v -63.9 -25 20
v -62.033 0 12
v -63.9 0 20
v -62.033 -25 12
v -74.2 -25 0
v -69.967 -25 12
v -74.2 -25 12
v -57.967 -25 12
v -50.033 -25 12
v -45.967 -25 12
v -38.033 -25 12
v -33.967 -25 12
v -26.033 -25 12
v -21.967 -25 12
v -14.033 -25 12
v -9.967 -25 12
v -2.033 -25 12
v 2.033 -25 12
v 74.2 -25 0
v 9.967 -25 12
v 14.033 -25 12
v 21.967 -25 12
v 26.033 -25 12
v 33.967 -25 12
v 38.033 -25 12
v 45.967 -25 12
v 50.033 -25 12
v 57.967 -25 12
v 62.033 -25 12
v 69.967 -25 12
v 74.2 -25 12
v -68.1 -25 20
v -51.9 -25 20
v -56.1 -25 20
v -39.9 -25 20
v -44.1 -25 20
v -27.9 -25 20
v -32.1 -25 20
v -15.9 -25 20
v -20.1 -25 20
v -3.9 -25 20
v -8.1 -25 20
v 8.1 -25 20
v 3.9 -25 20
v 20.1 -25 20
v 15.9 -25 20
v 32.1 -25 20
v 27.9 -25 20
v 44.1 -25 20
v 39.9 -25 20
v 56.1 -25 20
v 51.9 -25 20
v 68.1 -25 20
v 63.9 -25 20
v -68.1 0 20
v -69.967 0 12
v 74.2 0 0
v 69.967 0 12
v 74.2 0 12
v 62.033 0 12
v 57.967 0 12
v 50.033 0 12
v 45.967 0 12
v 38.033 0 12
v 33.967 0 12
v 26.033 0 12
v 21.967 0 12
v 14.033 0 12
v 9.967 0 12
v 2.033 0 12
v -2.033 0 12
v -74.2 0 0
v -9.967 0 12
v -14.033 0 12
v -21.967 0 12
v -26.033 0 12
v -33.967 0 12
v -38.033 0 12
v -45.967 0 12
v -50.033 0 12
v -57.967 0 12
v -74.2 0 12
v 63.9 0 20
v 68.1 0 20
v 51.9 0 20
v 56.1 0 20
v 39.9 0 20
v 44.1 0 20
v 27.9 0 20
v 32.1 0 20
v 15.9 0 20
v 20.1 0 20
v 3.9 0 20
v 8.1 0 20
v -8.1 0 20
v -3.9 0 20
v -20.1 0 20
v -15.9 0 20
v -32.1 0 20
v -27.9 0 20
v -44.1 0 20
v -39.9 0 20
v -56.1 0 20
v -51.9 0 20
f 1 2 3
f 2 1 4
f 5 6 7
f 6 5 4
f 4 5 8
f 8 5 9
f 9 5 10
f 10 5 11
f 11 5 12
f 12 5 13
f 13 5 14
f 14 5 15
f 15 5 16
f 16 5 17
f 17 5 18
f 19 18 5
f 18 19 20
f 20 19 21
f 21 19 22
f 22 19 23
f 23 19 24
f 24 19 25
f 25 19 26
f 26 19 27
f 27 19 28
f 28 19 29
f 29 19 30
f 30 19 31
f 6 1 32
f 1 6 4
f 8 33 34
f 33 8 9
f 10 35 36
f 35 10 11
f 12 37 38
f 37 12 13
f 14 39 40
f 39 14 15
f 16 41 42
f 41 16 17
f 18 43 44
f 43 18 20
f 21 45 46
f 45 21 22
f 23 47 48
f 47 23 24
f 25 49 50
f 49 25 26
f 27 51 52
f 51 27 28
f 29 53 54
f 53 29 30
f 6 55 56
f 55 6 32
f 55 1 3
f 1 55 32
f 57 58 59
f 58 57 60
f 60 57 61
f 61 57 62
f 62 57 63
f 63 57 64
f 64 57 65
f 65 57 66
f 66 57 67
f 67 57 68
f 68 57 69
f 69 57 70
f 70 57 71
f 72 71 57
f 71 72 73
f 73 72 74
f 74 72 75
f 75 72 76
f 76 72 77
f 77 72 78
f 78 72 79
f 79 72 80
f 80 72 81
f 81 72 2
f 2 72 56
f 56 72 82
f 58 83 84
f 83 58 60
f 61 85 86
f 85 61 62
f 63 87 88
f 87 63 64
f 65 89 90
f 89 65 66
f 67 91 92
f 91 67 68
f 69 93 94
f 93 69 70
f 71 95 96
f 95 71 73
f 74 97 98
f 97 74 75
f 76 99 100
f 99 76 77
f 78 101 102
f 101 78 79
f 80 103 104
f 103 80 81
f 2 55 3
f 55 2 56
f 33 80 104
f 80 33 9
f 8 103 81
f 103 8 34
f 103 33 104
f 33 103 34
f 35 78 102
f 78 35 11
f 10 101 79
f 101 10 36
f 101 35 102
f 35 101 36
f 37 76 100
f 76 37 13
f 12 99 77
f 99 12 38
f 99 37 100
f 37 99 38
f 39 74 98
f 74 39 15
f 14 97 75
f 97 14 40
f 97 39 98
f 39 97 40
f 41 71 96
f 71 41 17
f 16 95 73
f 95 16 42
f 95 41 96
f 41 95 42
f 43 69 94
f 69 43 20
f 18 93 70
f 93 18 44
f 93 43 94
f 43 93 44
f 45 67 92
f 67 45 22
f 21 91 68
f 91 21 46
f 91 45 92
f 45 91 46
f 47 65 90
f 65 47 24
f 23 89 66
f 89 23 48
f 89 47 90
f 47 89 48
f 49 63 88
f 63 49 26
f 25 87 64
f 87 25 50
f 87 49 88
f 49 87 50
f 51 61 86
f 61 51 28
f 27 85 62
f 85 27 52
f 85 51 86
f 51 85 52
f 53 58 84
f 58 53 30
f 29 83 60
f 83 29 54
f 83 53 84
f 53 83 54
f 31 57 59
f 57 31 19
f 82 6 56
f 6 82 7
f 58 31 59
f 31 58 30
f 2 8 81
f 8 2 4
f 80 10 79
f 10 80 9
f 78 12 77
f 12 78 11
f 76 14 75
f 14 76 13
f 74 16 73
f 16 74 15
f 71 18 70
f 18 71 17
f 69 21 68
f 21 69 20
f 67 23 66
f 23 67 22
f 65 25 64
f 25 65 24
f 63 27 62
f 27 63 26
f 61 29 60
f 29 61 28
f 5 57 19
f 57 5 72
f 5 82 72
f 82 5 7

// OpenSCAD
$fn = 32;

// ----------------------------------------------------------------------
// Toothed rack, 12 teeth
// 12 mm pitch, 8 mm teeth
// ----------------------------------------------------------------------

// --- parameters (mm) ---
bar_w = 25;     // bar width (Y)
bar_h = 12;     // bar height (Z)
teeth = 12;     // number of teeth
pitch = 12;     // tooth pitch
tooth_h = 8;    // tooth height above the bar
root_w = 8.4;   // tooth width at the root
crest_w = 4.2;  // tooth width at the crest

// --- derived feature positions (mm) ---
span = (teeth - 1) * pitch;  // = 132   distance between the outer teeth
bar_l = span + root_w + 8;   // = 148.4   bar length: teeth plus 4 mm at each end
tooth_x = -span / 2;         // = -66   X of the first tooth
height = bar_h + tooth_h;    // = 20   overall height
feature_centers = [
  [tooth_x + 0 * pitch, -bar_w / 2],
  [tooth_x + 1 * pitch, -bar_w / 2],
  [tooth_x + 2 * pitch, -bar_w / 2],
  [tooth_x + 3 * pitch, -bar_w / 2],
  [tooth_x + 4 * pitch, -bar_w / 2],
  [tooth_x + 5 * pitch, -bar_w / 2],
  [tooth_x + 6 * pitch, -bar_w / 2],
  [tooth_x + 7 * pitch, -bar_w / 2],
  [tooth_x + 8 * pitch, -bar_w / 2],
  [tooth_x + 9 * pitch, -bar_w / 2],
  [tooth_x + 10 * pitch, -bar_w / 2],
  [tooth_x + 11 * pitch, -bar_w / 2]
];   // tooth centre line, drives the tooth loop

// bar with a rack of teeth, one extruded trapezoium per centre
module rack_tooth() {
  linear_extrude(height = bar_w)
    polygon(points = [
      [0, 0],
      [root_w, 0],
      [root_w / 2 + crest_w / 2, tooth_h + 1],
      [root_w / 2 - crest_w / 2, tooth_h + 1]
    ]);
}

union() {
  translate([-bar_l / 2, -bar_w, 0]) cube([bar_l, bar_w, bar_h]);
  for (centre = feature_centers)
    translate([centre[0] - root_w / 2, 0, bar_h - 1]) rotate([90, 0, 0]) rack_tooth();
}
